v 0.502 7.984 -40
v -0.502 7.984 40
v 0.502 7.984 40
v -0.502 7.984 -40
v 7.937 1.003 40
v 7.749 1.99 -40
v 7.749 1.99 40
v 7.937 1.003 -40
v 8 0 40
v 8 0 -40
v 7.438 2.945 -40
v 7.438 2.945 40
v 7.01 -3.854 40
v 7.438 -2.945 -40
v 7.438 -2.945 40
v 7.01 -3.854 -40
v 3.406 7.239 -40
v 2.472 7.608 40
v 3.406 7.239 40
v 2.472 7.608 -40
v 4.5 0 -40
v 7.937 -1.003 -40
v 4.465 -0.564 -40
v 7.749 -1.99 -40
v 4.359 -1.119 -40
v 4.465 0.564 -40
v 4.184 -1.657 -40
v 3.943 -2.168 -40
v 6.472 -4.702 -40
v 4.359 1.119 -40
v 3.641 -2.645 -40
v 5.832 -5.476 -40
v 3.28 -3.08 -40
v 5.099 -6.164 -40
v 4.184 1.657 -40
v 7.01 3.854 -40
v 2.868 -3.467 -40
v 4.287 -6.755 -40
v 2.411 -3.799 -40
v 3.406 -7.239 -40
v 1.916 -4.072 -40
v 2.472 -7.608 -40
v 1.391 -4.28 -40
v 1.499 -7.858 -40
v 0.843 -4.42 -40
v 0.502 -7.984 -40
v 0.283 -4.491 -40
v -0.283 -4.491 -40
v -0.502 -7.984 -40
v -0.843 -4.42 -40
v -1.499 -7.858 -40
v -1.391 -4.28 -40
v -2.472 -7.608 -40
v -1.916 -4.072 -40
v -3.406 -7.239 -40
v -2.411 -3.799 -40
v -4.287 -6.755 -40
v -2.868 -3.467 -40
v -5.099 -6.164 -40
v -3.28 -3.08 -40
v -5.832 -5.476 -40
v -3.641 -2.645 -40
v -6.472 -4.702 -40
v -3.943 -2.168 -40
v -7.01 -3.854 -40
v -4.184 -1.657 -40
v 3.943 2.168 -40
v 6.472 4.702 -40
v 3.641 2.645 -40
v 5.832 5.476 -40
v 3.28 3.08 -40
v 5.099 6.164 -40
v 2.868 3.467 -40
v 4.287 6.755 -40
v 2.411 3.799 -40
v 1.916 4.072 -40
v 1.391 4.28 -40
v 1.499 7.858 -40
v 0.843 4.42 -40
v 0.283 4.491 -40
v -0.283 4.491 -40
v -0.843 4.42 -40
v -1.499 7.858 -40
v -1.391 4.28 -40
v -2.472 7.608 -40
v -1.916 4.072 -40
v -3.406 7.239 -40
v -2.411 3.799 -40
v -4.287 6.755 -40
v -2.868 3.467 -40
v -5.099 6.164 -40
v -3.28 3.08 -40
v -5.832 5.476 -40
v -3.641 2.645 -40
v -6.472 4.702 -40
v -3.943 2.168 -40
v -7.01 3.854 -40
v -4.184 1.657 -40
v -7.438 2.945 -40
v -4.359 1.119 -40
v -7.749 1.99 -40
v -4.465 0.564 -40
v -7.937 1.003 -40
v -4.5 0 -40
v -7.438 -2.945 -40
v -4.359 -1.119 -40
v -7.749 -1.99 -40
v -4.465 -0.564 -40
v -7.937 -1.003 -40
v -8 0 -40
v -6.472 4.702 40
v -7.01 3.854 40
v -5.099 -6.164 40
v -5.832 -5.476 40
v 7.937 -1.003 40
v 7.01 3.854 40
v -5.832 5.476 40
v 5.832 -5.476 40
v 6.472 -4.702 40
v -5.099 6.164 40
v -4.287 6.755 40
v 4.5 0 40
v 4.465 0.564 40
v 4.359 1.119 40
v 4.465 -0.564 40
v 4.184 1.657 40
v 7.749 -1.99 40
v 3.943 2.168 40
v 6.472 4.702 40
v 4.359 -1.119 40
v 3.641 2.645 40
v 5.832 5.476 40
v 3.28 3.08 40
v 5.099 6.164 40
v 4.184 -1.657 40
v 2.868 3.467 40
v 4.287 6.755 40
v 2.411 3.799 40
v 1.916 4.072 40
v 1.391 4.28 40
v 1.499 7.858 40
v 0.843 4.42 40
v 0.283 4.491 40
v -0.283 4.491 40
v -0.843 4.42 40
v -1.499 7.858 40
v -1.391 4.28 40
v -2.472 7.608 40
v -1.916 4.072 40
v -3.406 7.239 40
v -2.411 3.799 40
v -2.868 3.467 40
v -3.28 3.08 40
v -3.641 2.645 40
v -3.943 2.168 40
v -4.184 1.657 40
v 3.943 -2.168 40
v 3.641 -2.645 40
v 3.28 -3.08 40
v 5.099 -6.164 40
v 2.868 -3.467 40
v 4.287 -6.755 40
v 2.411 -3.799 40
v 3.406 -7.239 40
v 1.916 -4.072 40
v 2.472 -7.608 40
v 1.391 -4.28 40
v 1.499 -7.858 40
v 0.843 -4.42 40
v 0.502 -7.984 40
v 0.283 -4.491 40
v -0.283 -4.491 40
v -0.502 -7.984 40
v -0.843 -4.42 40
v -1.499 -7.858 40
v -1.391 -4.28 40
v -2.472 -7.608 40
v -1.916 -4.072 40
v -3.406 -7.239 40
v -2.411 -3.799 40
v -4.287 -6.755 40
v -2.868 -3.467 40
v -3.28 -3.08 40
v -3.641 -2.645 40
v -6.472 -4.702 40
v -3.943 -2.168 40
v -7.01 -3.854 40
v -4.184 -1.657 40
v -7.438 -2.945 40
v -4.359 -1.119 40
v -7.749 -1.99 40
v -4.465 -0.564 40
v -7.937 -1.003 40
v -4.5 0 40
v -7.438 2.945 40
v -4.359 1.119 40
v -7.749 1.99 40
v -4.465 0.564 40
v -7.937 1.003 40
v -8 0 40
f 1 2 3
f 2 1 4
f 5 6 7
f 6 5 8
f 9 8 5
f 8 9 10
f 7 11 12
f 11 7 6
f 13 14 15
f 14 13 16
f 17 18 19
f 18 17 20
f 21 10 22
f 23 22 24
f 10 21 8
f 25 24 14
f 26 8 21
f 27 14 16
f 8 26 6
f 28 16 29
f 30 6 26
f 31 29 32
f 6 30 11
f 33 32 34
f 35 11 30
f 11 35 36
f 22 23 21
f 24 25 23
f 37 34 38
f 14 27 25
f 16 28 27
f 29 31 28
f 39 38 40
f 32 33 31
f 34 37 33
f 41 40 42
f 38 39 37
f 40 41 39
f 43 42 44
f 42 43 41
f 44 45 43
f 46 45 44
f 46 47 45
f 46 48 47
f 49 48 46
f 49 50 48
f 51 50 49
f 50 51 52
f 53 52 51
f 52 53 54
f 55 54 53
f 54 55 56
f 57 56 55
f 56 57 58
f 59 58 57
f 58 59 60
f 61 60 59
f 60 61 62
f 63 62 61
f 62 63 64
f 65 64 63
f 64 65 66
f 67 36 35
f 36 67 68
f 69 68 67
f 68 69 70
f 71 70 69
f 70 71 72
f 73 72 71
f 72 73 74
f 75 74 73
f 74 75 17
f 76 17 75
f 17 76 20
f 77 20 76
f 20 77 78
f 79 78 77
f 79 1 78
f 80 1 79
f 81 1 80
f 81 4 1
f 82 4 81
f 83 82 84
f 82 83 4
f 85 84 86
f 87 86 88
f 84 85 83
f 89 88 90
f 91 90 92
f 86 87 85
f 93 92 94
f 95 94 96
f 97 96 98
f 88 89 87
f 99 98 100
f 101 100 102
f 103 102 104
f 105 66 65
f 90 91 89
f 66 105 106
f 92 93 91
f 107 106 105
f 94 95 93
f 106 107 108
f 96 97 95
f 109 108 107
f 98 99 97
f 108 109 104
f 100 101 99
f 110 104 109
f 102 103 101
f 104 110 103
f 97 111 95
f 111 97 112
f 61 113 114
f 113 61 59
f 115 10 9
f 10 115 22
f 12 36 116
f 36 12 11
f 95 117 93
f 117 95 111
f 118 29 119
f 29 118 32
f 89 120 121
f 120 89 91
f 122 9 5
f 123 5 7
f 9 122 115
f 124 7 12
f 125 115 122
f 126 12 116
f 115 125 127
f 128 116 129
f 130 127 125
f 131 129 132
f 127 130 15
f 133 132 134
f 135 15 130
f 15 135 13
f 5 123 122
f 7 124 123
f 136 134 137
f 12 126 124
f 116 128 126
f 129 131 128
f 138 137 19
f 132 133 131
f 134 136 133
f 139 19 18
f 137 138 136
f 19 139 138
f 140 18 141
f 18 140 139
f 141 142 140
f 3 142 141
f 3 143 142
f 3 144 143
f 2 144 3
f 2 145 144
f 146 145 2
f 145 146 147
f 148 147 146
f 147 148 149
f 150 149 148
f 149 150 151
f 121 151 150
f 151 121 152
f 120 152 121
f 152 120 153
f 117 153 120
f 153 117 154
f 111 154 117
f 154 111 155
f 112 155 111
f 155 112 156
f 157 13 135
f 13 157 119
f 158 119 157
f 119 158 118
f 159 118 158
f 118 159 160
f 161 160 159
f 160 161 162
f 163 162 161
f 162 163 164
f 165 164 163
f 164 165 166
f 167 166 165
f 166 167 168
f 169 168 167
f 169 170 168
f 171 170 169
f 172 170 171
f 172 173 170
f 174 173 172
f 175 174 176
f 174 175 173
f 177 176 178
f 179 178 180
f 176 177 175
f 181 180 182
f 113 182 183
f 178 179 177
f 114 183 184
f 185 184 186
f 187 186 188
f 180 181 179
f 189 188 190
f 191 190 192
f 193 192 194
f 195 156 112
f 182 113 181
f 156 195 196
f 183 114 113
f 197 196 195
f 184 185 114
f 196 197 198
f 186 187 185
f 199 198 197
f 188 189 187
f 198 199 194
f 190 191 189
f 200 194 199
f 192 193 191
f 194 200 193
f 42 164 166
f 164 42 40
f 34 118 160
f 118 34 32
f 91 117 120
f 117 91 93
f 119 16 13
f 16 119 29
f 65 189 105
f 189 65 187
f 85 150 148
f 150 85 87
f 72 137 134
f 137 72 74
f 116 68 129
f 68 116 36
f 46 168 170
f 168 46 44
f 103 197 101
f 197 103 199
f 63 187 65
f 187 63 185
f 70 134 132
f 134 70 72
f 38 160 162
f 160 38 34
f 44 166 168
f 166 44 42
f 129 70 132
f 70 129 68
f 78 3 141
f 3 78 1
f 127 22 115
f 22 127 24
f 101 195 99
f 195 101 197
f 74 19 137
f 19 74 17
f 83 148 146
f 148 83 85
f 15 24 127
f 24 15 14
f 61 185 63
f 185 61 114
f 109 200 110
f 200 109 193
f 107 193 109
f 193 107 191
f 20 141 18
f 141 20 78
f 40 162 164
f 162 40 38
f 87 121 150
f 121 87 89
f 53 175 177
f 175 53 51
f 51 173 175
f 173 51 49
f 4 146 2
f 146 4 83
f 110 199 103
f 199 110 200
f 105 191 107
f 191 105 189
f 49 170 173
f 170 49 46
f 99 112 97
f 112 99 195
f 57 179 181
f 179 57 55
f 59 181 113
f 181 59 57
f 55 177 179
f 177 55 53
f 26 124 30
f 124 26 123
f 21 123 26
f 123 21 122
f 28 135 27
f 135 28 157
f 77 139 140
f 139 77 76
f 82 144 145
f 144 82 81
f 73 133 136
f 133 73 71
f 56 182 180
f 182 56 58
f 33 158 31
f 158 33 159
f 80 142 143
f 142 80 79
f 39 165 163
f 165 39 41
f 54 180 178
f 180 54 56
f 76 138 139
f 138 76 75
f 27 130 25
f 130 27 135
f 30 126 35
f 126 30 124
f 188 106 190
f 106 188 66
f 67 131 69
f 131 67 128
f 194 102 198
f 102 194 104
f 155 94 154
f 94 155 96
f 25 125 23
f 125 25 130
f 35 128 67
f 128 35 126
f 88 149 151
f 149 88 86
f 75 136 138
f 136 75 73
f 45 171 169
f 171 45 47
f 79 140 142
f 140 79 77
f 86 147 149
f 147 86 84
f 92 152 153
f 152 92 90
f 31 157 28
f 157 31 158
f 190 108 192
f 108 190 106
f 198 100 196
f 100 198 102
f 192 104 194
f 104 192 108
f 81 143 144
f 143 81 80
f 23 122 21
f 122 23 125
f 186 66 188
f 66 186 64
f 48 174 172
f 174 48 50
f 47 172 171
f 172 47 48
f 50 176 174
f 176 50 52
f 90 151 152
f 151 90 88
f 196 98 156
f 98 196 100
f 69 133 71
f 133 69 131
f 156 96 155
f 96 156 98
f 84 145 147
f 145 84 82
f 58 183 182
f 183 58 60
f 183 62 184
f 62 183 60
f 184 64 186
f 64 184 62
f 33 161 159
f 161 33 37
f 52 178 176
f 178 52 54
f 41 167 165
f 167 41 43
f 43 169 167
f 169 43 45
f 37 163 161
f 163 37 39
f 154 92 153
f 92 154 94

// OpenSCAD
$fn = 50;


difference() {
	union() {
		translate(v = [0, 0, -40.0000000000]) {
			cylinder(h = 80, r = 8.0000000000);
		}
	}
	union() {
		translate(v = [0, 0, -100.0000000000]) {
			cylinder(h = 200, r = 4.5000000000);
		}
	}
}
